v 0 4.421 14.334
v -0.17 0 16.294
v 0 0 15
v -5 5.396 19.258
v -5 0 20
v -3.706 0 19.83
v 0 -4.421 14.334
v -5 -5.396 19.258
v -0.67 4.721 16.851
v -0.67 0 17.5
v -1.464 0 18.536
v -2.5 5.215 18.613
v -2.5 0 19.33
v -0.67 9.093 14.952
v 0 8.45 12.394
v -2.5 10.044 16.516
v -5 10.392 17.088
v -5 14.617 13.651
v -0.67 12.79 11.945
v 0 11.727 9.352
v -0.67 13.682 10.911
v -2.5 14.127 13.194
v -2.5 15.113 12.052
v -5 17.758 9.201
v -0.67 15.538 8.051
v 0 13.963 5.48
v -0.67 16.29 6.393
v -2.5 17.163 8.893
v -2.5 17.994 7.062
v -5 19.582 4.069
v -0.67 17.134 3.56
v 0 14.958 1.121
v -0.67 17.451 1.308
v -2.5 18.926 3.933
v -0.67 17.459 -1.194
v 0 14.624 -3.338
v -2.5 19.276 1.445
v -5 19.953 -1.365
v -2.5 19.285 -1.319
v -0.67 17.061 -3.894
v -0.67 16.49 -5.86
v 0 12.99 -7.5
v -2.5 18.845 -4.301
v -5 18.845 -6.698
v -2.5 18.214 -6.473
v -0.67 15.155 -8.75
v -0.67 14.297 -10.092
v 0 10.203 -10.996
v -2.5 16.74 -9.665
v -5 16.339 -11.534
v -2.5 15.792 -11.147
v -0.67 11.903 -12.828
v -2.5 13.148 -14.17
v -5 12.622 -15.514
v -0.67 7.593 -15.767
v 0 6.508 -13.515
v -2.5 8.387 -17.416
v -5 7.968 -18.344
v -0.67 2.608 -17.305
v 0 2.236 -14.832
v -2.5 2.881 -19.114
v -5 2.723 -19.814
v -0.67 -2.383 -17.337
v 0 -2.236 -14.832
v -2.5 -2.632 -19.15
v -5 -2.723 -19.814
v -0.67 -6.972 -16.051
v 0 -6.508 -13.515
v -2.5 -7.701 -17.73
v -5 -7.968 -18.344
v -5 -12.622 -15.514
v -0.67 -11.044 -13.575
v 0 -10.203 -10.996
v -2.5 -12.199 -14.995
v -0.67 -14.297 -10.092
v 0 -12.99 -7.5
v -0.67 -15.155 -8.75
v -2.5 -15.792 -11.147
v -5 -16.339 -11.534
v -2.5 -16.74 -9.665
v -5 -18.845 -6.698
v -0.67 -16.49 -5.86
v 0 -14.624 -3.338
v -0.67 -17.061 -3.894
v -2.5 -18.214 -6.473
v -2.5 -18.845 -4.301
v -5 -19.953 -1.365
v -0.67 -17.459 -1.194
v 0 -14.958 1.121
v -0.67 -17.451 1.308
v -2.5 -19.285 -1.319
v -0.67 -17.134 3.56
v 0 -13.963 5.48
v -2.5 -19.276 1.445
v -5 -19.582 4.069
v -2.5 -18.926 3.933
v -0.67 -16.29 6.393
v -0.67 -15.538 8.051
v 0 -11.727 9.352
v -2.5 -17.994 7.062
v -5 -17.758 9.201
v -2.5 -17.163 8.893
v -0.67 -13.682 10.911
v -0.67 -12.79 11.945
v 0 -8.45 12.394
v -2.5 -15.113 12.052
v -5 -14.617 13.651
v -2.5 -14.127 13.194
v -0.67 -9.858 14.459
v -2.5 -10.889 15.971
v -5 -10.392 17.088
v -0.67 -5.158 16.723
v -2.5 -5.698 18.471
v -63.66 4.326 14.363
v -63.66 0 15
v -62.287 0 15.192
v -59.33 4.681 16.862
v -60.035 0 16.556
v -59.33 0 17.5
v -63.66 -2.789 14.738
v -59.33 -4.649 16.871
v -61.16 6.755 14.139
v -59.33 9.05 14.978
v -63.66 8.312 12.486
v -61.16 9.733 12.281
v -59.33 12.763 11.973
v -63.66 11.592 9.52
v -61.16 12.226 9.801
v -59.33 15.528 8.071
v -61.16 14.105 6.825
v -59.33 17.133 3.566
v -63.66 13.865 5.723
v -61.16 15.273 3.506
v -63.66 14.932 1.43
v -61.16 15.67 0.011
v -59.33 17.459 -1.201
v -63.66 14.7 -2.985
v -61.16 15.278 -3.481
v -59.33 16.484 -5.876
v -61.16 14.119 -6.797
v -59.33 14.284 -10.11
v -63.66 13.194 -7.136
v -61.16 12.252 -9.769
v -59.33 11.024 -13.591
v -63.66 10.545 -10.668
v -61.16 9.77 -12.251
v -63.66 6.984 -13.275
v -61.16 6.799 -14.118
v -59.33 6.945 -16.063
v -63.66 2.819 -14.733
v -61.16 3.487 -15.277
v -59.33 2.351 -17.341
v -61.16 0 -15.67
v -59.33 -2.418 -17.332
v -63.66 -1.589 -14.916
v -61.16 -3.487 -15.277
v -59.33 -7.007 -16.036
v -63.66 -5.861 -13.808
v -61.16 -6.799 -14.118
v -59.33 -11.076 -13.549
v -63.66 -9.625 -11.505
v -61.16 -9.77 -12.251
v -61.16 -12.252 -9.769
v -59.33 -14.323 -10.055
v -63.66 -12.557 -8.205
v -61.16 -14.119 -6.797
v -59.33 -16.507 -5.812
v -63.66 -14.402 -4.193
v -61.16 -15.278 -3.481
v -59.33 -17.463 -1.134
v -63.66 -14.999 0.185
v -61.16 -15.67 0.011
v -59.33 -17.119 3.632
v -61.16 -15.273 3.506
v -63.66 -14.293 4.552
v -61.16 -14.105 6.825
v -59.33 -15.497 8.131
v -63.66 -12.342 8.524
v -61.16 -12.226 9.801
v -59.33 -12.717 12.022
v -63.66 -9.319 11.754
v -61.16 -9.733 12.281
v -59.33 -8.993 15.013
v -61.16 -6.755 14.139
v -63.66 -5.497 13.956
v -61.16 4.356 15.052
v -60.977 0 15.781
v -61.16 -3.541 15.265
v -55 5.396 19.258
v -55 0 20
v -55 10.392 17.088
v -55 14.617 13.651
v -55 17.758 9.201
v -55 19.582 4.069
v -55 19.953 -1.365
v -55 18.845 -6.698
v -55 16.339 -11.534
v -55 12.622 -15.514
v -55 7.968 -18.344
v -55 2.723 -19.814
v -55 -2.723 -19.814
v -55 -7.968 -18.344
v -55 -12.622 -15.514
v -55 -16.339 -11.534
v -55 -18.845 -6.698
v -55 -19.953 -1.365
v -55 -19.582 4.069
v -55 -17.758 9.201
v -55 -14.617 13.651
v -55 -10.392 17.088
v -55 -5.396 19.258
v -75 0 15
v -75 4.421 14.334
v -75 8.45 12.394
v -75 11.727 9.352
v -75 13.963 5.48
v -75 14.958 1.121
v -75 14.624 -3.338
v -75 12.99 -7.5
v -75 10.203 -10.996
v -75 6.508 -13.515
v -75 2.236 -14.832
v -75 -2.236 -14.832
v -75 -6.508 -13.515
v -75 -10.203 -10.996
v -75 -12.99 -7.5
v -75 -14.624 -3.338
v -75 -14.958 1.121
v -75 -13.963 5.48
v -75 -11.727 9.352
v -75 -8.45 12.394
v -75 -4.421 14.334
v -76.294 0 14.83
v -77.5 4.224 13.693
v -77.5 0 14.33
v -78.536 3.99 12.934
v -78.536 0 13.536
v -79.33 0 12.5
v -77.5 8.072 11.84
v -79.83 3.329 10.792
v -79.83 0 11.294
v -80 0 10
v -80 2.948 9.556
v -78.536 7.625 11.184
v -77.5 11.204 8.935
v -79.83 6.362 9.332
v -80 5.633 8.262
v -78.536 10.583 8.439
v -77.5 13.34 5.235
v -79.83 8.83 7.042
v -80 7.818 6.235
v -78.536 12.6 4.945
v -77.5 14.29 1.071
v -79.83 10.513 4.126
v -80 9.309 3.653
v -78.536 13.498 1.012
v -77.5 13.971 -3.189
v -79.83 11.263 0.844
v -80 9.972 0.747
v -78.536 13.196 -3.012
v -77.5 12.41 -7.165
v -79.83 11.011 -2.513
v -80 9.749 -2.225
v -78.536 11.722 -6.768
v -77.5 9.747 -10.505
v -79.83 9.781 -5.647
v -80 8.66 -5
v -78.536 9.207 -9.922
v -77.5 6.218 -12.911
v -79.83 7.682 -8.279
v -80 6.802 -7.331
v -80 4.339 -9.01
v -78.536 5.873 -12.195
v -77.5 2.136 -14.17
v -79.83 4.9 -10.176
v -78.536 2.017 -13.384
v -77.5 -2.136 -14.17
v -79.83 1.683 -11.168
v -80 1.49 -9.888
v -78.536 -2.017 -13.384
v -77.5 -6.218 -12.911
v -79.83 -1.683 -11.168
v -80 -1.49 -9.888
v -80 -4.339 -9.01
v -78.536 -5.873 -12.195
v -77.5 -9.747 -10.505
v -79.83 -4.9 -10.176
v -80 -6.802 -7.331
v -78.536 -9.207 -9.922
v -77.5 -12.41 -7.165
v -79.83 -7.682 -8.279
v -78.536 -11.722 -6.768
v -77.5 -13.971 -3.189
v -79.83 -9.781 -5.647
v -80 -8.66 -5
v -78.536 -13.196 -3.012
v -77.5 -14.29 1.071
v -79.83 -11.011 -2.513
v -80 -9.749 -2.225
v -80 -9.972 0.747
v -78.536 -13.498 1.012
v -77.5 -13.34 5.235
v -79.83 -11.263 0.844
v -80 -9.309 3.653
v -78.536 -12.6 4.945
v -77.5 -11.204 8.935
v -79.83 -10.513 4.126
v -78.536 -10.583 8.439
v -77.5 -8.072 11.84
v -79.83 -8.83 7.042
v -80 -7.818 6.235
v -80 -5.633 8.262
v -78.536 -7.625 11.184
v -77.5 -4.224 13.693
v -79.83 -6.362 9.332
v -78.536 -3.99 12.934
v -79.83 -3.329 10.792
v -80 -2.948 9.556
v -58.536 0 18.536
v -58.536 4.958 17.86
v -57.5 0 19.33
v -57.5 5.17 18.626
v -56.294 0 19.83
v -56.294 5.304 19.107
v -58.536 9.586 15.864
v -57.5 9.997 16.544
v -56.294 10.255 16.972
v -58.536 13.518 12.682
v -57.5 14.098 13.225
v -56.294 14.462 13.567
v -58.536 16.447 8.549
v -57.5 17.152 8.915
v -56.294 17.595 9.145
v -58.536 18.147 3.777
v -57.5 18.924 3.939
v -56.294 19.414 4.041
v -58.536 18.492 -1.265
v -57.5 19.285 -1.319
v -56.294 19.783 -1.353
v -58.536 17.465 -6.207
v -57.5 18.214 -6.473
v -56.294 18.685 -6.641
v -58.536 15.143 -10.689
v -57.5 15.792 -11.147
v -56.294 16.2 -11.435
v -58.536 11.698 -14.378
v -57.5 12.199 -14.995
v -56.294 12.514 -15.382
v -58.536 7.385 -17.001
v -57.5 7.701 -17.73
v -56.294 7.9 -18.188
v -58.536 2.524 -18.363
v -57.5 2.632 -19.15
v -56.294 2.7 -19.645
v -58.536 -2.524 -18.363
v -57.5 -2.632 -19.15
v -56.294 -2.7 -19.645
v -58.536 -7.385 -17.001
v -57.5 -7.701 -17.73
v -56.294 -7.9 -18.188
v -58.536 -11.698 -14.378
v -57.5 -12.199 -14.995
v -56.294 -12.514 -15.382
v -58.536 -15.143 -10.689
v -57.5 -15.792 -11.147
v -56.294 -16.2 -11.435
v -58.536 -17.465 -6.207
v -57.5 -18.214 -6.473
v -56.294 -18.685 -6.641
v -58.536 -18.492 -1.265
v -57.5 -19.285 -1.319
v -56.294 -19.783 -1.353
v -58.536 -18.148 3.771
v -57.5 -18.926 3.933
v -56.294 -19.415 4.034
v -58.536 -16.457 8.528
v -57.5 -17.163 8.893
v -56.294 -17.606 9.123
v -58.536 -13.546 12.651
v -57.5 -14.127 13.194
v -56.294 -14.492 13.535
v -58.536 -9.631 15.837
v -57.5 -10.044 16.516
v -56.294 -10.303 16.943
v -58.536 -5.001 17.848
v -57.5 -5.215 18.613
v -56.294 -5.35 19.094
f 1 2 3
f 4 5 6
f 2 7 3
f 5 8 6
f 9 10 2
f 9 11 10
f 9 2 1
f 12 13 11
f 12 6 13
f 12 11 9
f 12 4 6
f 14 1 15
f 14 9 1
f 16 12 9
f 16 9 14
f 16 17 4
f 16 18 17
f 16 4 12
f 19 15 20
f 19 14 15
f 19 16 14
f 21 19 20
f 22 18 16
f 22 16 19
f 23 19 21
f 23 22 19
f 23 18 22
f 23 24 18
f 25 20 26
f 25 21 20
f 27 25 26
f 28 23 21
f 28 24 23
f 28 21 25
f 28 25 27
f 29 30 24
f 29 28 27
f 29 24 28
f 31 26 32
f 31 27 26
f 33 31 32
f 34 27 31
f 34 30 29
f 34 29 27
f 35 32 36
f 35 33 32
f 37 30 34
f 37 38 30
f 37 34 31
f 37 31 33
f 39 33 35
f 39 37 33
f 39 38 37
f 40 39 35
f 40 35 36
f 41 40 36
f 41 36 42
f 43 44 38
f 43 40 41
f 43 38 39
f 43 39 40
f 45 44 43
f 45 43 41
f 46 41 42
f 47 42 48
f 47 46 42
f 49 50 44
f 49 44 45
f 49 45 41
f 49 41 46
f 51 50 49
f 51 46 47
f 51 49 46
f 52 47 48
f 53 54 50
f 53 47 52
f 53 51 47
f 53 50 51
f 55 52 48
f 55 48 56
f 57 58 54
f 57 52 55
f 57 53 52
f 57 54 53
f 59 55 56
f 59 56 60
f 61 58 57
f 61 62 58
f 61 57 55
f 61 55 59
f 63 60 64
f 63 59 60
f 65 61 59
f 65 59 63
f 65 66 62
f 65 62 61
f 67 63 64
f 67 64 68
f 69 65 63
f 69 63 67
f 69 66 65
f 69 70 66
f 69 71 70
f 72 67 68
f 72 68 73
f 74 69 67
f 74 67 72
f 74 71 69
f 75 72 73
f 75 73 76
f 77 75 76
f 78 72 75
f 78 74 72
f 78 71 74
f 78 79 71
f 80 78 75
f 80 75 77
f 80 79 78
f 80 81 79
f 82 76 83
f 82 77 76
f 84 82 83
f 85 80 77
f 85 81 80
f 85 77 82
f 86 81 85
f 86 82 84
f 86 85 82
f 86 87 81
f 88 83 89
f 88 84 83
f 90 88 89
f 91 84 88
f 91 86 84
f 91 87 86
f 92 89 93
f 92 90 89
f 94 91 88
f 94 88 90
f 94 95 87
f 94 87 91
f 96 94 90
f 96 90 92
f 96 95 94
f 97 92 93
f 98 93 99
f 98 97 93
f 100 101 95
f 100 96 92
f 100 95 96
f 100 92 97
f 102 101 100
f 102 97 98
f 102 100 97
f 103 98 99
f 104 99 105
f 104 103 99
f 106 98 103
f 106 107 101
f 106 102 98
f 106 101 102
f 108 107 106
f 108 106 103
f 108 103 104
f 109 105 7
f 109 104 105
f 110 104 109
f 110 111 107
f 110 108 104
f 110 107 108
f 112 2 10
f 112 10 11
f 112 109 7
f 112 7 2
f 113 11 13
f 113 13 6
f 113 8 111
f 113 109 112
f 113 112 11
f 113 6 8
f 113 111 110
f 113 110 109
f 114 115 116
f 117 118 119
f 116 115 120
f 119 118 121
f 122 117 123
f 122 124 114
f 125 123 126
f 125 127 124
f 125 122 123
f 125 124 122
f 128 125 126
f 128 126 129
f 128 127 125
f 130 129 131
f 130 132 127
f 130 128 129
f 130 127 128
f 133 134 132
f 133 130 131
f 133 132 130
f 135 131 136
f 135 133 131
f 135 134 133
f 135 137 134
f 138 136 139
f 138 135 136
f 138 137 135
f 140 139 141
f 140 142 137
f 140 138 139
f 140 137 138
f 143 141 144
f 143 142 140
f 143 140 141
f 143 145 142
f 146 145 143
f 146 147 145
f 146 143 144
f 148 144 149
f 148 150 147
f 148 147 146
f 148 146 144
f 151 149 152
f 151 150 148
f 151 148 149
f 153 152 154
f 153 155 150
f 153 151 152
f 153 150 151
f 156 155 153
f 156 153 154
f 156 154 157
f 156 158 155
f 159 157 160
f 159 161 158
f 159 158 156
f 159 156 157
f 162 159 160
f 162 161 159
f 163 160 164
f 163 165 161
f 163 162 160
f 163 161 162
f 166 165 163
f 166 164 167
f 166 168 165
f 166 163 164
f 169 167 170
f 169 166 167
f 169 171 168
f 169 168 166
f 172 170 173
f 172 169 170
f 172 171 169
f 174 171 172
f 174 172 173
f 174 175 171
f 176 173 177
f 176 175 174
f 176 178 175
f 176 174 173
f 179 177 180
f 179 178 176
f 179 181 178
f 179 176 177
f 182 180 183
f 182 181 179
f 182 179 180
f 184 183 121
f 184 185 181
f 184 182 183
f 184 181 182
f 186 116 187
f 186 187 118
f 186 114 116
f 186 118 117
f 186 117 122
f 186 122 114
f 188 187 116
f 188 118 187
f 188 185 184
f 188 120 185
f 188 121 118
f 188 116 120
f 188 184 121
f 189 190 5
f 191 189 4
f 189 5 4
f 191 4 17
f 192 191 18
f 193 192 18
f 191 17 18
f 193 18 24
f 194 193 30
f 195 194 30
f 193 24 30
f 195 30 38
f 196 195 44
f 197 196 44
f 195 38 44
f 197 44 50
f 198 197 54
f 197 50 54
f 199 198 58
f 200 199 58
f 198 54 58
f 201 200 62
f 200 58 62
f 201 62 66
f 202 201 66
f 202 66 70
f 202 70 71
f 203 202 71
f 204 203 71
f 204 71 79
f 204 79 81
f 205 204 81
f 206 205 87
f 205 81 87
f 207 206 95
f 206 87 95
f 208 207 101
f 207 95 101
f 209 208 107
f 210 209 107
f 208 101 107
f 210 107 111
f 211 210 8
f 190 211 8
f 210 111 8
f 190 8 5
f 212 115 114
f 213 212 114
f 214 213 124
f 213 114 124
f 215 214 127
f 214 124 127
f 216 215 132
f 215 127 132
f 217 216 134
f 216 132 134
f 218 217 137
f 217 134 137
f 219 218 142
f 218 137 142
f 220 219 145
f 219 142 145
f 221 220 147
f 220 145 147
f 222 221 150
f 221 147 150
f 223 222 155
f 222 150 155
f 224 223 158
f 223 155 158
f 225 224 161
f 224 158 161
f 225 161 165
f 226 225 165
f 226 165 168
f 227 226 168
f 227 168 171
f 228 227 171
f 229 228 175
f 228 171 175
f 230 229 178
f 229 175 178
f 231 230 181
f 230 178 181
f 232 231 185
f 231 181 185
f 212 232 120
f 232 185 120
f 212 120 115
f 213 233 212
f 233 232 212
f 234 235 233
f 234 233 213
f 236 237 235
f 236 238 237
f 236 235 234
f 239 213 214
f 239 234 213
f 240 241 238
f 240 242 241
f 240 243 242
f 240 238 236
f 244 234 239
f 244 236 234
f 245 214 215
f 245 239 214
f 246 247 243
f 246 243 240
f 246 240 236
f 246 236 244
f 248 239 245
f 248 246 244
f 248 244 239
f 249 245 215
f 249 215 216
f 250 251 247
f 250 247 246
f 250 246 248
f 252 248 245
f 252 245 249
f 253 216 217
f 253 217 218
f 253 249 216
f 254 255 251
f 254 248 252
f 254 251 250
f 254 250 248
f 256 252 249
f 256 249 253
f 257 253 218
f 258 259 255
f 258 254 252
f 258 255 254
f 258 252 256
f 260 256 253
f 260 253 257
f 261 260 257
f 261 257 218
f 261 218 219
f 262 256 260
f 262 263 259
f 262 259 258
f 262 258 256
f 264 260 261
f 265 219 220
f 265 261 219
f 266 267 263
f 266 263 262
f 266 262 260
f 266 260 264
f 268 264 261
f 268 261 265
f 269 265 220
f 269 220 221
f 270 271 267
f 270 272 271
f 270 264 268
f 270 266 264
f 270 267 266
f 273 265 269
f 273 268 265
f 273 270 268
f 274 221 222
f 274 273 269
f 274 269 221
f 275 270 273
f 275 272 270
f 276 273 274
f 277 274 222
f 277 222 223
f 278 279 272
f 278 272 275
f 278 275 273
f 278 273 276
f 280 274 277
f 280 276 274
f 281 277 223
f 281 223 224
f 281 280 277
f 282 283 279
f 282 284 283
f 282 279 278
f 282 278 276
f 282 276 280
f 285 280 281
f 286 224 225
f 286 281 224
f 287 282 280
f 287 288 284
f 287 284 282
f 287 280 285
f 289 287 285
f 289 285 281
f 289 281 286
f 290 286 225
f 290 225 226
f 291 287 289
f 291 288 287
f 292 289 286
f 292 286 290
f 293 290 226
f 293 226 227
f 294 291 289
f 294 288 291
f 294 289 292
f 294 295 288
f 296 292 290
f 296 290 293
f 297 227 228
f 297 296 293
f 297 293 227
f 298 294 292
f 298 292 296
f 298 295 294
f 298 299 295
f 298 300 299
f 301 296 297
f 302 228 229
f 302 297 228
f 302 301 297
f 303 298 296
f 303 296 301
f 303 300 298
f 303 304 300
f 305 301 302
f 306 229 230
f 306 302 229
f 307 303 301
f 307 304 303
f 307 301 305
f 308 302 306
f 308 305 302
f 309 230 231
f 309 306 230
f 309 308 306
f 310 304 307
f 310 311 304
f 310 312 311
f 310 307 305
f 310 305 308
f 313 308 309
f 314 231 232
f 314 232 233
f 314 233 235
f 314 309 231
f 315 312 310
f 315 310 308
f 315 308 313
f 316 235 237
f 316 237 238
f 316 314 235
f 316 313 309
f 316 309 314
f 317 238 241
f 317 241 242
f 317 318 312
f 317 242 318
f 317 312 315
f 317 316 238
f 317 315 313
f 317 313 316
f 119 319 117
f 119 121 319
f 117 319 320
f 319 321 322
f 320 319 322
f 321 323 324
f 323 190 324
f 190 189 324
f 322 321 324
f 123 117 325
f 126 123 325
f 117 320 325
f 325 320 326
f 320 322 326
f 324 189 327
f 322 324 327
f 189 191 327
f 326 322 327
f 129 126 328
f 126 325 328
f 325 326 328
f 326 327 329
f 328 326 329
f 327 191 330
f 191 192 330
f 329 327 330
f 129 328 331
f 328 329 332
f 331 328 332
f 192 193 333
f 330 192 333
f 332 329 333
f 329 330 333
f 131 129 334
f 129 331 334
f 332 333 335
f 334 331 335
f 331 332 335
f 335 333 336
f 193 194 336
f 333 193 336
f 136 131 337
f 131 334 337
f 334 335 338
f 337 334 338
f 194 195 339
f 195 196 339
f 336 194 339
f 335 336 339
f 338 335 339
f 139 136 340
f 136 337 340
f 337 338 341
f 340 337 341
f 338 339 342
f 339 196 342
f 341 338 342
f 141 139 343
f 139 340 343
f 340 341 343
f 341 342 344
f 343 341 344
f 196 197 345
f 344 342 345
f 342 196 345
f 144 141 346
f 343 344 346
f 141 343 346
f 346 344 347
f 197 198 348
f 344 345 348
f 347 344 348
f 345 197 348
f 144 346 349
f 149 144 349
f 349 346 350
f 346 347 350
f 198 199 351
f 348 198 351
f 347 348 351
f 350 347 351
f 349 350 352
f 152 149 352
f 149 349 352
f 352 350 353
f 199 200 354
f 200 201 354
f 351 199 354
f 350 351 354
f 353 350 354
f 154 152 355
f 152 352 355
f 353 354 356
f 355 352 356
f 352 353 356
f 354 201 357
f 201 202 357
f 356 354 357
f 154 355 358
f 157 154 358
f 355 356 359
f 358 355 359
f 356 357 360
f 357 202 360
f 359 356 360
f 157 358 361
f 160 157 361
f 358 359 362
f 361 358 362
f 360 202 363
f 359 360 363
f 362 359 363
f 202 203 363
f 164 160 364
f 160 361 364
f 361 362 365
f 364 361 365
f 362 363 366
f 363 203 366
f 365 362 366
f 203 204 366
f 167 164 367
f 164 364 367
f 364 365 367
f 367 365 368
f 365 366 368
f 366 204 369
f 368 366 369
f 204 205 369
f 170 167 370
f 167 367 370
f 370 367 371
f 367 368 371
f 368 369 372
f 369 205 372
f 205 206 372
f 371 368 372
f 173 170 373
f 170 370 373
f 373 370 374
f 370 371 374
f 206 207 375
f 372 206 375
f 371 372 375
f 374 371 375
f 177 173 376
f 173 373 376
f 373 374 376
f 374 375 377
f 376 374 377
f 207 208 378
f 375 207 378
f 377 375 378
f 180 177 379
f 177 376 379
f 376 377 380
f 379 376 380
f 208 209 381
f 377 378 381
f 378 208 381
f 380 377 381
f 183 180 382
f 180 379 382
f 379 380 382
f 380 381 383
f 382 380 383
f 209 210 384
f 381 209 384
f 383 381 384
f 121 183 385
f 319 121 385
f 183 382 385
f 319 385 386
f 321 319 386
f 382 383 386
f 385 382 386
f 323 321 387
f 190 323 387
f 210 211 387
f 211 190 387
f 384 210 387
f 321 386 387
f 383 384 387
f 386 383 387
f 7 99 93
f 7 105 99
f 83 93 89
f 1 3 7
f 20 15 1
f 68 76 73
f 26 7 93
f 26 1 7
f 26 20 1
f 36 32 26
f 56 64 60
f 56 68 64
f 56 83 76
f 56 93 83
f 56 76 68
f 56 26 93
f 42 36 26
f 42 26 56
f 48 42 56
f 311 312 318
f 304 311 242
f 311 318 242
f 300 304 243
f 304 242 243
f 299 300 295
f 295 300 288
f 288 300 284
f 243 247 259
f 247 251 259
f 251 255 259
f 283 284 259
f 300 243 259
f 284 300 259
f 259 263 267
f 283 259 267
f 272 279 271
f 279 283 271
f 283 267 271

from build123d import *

# Parameters (mm, degrees)
F0_W     = 60
F0_H     = 20
F2_R     = 5
F3_DEPTH = 20
F4_R     = 5


with BuildPart() as f1:
    # F0 (on Front) → F1 (revolve)
    with BuildSketch(Plane.XZ):
        with Locations((-30, 10)):
            Rectangle(F0_W, F0_H)
    revolve(axis=Axis((-30, 0, 0), (-1, 0, 0)))

    # F2
    f2_edges = [f1.edges().sort_by_distance(p)[0] for p in [
        (-60, 0, -20),
        (0, 0, -20),
    ]]
    fillet(f2_edges, radius=F2_R)

    # F3 (add): a face of the model
    f3_faces = [f1.faces().sort_by_distance(p)[0] for p in [
        (-60, 0, 0),
    ]]
    extrude(f3_faces, amount=F3_DEPTH)

    # F4
    f4_edges = [f1.edges().sort_by_distance(p)[0] for p in [
        (-60, 0, -15),
        (-80, 0, -15),
    ]]
    fillet(f4_edges, radius=F4_R)


solid = f1.part
